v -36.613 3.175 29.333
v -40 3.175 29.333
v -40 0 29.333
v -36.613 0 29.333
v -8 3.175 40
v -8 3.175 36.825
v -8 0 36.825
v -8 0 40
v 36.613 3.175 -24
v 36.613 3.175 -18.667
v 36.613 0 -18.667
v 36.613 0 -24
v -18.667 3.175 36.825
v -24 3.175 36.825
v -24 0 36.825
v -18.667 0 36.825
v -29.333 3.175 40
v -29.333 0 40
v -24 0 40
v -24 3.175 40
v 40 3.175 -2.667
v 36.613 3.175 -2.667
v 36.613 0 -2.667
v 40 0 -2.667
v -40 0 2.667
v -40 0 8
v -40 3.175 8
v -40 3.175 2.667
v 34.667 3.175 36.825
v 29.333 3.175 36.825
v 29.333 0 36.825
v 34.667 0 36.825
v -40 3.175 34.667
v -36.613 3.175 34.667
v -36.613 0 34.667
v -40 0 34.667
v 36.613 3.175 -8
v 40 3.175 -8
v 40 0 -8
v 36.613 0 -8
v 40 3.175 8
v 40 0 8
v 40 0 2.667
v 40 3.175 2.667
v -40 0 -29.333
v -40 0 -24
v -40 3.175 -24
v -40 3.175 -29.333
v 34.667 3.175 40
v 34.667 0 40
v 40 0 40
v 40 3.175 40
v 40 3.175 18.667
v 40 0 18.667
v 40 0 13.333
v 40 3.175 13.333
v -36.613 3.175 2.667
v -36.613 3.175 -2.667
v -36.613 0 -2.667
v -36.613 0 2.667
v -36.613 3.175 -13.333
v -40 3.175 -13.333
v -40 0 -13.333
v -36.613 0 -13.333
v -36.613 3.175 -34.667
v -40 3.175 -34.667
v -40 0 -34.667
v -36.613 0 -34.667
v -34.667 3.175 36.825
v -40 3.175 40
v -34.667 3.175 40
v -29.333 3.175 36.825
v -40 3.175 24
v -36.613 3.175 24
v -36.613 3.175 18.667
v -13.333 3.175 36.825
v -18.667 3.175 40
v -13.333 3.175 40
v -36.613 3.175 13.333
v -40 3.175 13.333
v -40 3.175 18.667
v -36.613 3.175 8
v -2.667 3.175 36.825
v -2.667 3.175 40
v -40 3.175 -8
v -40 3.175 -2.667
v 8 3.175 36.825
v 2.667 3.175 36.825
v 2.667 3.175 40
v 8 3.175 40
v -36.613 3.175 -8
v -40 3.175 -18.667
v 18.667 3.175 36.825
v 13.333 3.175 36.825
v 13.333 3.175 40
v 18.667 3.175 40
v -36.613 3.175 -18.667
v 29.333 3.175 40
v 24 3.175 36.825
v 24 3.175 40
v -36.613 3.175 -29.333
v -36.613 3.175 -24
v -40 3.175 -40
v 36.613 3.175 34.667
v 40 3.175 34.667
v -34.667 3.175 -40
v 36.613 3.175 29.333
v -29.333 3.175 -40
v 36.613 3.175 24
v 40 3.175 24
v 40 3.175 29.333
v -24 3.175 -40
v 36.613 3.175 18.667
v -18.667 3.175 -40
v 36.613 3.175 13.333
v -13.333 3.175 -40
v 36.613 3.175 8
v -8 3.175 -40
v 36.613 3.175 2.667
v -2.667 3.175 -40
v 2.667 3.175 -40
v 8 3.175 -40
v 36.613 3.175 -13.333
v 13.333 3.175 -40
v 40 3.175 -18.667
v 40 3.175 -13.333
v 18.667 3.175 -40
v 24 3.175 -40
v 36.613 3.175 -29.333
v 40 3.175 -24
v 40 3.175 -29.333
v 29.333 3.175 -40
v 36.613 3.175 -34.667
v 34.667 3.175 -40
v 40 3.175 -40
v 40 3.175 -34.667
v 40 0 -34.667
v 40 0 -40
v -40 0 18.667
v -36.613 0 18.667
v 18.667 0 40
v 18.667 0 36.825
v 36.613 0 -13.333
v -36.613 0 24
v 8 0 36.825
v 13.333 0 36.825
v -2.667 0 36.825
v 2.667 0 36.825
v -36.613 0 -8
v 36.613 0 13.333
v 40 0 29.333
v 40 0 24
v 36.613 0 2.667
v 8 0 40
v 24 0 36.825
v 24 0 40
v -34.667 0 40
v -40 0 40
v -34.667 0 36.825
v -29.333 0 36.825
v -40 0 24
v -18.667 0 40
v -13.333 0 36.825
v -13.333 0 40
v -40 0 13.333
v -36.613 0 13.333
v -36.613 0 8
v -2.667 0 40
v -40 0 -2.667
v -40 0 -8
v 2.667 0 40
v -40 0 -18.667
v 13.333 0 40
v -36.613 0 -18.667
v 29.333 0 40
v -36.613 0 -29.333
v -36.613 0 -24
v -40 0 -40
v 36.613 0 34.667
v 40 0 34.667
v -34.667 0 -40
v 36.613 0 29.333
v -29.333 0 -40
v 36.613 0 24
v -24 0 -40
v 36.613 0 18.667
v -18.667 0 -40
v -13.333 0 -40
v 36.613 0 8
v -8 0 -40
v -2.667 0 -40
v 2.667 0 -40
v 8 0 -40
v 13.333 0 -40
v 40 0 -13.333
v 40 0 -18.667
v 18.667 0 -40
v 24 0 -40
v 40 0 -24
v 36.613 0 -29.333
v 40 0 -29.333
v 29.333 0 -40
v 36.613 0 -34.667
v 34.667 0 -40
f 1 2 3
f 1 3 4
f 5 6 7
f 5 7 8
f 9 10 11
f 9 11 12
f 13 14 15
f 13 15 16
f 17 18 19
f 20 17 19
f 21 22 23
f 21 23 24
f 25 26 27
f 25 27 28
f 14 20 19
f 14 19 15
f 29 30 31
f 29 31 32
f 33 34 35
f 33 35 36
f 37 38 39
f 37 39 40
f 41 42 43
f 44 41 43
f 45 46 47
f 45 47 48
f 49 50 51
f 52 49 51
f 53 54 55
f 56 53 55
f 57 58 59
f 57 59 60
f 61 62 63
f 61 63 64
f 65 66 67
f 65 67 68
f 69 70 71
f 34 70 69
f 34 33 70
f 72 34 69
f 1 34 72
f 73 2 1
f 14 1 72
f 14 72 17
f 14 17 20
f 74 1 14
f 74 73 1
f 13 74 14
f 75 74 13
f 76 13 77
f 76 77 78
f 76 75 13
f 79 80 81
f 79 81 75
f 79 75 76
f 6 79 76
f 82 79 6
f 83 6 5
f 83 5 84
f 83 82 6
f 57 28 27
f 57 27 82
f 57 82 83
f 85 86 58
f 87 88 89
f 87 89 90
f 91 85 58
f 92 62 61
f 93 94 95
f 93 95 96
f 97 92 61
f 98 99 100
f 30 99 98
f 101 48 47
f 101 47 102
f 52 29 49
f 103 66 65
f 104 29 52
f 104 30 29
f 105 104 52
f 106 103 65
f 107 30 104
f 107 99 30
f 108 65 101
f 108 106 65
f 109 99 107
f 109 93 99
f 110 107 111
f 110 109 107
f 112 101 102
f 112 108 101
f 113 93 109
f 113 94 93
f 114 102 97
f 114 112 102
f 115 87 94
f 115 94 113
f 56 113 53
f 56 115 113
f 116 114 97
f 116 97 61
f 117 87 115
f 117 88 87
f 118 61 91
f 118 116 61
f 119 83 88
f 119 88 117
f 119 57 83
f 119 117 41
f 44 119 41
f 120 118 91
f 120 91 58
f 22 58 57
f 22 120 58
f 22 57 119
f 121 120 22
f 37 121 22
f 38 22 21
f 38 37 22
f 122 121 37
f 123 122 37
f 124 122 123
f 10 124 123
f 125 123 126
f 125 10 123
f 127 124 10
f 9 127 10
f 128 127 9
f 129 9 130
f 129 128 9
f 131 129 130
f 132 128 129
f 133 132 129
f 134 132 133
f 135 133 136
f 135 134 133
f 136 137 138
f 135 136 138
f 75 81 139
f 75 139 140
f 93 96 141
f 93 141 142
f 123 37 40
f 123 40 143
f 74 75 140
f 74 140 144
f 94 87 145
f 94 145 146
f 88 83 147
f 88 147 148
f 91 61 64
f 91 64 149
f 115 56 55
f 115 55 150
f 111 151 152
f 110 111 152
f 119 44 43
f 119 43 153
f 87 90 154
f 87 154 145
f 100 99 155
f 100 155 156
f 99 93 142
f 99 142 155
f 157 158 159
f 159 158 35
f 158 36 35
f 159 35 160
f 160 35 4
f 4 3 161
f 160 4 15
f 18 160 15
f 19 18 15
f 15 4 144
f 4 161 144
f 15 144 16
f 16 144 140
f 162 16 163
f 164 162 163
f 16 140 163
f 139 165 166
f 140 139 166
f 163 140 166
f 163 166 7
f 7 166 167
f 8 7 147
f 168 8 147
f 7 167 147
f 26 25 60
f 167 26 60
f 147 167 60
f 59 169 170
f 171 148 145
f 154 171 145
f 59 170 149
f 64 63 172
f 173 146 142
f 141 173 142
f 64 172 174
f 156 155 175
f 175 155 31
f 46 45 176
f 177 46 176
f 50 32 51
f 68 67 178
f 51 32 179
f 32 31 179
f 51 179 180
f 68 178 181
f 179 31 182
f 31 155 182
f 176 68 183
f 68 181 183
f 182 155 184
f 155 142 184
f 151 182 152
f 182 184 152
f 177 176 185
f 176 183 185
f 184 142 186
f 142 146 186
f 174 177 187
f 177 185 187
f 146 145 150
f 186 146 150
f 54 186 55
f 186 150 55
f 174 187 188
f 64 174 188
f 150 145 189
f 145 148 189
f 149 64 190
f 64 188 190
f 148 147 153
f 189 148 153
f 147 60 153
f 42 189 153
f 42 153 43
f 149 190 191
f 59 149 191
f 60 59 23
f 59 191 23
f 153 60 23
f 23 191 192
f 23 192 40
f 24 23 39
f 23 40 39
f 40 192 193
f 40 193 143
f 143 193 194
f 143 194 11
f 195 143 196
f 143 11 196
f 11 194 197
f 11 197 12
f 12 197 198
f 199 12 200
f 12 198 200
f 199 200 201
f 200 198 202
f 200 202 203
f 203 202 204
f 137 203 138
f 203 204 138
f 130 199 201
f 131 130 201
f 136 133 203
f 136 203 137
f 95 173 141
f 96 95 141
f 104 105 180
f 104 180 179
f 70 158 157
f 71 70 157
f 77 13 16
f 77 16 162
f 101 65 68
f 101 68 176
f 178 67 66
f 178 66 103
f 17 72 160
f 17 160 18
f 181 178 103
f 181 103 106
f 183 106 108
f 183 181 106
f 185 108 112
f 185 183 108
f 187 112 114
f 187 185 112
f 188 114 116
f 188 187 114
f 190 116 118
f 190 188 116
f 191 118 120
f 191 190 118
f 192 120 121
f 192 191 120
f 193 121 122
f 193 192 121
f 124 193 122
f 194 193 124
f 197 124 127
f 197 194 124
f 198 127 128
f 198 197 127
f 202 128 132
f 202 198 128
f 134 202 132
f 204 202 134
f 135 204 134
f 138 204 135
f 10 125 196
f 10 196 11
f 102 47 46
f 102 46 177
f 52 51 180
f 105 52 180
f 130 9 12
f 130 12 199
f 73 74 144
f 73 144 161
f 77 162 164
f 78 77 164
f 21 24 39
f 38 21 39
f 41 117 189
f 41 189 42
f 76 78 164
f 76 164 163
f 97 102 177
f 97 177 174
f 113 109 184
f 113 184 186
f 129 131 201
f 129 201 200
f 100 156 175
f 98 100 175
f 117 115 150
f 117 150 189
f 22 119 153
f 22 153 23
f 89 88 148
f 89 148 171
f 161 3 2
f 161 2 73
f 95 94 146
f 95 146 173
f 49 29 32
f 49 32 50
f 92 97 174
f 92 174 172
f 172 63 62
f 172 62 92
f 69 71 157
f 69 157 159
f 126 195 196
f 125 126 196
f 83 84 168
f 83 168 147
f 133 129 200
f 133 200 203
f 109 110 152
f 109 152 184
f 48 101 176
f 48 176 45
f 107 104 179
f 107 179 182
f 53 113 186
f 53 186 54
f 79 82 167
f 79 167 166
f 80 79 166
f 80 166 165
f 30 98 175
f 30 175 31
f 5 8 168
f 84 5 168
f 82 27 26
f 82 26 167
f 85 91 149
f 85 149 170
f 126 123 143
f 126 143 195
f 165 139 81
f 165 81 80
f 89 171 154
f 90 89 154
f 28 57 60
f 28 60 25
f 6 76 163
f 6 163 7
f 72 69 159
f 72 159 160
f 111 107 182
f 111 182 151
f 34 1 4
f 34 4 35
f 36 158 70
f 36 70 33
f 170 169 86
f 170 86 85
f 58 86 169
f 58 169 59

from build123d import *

# Parameters (mm, degrees)
SKETCH1_W           = 80
SKETCH1_H           = 80
BOSS_EXTRUDE1_DEPTH = 3.175
SKETCH3_OUTSIDE_W   = 104.636
SKETCH3_OUTSIDE_H   = 104.636
CUT_EXTRUDE1_DEPTH  = 57.657573413
SKETCH8_W           = 80
SKETCH8_H           = 5.333333333
BOSS_EXTRUDE2_DEPTH = 3.175


with BuildPart() as part:
    # Sketch1 → Boss-Extrude1 (new body)
    with BuildSketch(Plane(origin=(0, 0, 0), x_dir=(1, 0, 0), z_dir=(0, 1, 0))):
        Rectangle(SKETCH1_W, SKETCH1_H)
    extrude(amount=BOSS_EXTRUDE1_DEPTH)

    # Sketch3 outside → Cut-Extrude1 (cut, through all)
    with BuildSketch(Plane(origin=(0, 3.175, 0), x_dir=(1, 0, 0), z_dir=(0, 1, 0))):
        Rectangle(SKETCH3_OUTSIDE_W, SKETCH3_OUTSIDE_H)
        Polygon((-40, -40), (-34.666666667, -40), (-34.666666667, -36.825), (-29.333333333, -36.825), (-29.333333333, -40), (-24, -40), (-24, -36.825), (-18.666666667, -36.825), (-18.666666667, -40), (-13.333333333, -40), (-13.333333333, -36.825), (-8, -36.825), (-8, -40), (-2.666666667, -40), (-2.666666667, -36.825), (2.666666667, -36.825), (2.666666667, -40), (8, -40), (8, -36.825), (13.333333333, -36.825), (13.333333333, -40), (18.666666667, -40), (18.666666667, -36.825), (24, -36.825), (24, -40), (29.333333333, -40), (29.333333333, -36.825), (34.666666667, -36.825), (34.666666667, -40), (40, -40), (40, -34.666666667), (36.613333333, -34.666666667), (36.613333333, -29.333333333), (40, -29.333333333), (40, -24), (36.613333333, -24), (36.613333333, -18.666666667), (40, -18.666666667), (40, -13.333333333), (36.613333333, -13.333333333), (36.613333333, -8), (40, -8), (40, -2.666666667), (36.613333333, -2.666666667), (36.613333333, 2.666666667), (40, 2.666666667), (40, 8), (36.613333333, 8), (36.613333333, 13.333333333), (40, 13.333333333), (40, 18.666666667), (36.613333333, 18.666666667), (36.613333333, 24), (40, 24), (40, 29.333333333), (36.613333333, 29.333333333), (36.613333333, 34.666666667), (40, 34.666666667), (40, 40), (34.666666667, 40), (34.666666667, 36.825), (29.333333333, 36.825), (29.333333333, 40), (24, 40), (24, 36.825), (18.666666667, 36.825), (18.666666667, 40), (13.333333333, 40), (13.333333333, 36.825), (8, 36.825), (8, 40), (2.666666667, 40), (2.666666667, 36.825), (-2.666666667, 36.825), (-2.666666667, 40), (-8, 40), (-8, 36.825), (-13.333333333, 36.825), (-13.333333333, 40), (-18.666666667, 40), (-18.666666667, 36.825), (-24, 36.825), (-24, 40), (-29.333333333, 40), (-29.333333333, 36.825), (-34.666666667, 36.825), (-34.666666667, 40), (-40, 40), (-40, 34.666666667), (-36.613333333, 34.666666667), (-36.613333333, 29.333333333), (-40, 29.333333333), (-40, 24), (-36.613333333, 24), (-36.613333333, 18.666666667), (-40, 18.666666667), (-40, 13.333333333), (-36.613333333, 13.333333333), (-36.613333333, 8), (-40, 8), (-40, 2.666666667), (-36.613333333, 2.666666667), (-36.613333333, -2.666666667), (-40, -2.666666667), (-40, -8), (-36.613333333, -8), (-36.613333333, -13.333333333), (-40, -13.333333333), (-40, -18.666666667), (-36.613333333, -18.666666667), (-36.613333333, -24), (-40, -24), (-40, -29.333333333), (-36.613333333, -29.333333333), (-36.613333333, -34.666666667), (-40, -34.666666667), align=None, mode=Mode.SUBTRACT)
    extrude(amount=-CUT_EXTRUDE1_DEPTH, mode=Mode.SUBTRACT)

    # Sketch8 → Boss-Extrude2 (add)
    with BuildSketch(Plane(origin=(0, 3.175, 0), x_dir=(1, 0, 0), z_dir=(0, 1, 0))):
        with Locations((0, 37.333333334)):
            Rectangle(SKETCH8_W, SKETCH8_H)
    extrude(amount=-BOSS_EXTRUDE2_DEPTH)


solid = part.part
